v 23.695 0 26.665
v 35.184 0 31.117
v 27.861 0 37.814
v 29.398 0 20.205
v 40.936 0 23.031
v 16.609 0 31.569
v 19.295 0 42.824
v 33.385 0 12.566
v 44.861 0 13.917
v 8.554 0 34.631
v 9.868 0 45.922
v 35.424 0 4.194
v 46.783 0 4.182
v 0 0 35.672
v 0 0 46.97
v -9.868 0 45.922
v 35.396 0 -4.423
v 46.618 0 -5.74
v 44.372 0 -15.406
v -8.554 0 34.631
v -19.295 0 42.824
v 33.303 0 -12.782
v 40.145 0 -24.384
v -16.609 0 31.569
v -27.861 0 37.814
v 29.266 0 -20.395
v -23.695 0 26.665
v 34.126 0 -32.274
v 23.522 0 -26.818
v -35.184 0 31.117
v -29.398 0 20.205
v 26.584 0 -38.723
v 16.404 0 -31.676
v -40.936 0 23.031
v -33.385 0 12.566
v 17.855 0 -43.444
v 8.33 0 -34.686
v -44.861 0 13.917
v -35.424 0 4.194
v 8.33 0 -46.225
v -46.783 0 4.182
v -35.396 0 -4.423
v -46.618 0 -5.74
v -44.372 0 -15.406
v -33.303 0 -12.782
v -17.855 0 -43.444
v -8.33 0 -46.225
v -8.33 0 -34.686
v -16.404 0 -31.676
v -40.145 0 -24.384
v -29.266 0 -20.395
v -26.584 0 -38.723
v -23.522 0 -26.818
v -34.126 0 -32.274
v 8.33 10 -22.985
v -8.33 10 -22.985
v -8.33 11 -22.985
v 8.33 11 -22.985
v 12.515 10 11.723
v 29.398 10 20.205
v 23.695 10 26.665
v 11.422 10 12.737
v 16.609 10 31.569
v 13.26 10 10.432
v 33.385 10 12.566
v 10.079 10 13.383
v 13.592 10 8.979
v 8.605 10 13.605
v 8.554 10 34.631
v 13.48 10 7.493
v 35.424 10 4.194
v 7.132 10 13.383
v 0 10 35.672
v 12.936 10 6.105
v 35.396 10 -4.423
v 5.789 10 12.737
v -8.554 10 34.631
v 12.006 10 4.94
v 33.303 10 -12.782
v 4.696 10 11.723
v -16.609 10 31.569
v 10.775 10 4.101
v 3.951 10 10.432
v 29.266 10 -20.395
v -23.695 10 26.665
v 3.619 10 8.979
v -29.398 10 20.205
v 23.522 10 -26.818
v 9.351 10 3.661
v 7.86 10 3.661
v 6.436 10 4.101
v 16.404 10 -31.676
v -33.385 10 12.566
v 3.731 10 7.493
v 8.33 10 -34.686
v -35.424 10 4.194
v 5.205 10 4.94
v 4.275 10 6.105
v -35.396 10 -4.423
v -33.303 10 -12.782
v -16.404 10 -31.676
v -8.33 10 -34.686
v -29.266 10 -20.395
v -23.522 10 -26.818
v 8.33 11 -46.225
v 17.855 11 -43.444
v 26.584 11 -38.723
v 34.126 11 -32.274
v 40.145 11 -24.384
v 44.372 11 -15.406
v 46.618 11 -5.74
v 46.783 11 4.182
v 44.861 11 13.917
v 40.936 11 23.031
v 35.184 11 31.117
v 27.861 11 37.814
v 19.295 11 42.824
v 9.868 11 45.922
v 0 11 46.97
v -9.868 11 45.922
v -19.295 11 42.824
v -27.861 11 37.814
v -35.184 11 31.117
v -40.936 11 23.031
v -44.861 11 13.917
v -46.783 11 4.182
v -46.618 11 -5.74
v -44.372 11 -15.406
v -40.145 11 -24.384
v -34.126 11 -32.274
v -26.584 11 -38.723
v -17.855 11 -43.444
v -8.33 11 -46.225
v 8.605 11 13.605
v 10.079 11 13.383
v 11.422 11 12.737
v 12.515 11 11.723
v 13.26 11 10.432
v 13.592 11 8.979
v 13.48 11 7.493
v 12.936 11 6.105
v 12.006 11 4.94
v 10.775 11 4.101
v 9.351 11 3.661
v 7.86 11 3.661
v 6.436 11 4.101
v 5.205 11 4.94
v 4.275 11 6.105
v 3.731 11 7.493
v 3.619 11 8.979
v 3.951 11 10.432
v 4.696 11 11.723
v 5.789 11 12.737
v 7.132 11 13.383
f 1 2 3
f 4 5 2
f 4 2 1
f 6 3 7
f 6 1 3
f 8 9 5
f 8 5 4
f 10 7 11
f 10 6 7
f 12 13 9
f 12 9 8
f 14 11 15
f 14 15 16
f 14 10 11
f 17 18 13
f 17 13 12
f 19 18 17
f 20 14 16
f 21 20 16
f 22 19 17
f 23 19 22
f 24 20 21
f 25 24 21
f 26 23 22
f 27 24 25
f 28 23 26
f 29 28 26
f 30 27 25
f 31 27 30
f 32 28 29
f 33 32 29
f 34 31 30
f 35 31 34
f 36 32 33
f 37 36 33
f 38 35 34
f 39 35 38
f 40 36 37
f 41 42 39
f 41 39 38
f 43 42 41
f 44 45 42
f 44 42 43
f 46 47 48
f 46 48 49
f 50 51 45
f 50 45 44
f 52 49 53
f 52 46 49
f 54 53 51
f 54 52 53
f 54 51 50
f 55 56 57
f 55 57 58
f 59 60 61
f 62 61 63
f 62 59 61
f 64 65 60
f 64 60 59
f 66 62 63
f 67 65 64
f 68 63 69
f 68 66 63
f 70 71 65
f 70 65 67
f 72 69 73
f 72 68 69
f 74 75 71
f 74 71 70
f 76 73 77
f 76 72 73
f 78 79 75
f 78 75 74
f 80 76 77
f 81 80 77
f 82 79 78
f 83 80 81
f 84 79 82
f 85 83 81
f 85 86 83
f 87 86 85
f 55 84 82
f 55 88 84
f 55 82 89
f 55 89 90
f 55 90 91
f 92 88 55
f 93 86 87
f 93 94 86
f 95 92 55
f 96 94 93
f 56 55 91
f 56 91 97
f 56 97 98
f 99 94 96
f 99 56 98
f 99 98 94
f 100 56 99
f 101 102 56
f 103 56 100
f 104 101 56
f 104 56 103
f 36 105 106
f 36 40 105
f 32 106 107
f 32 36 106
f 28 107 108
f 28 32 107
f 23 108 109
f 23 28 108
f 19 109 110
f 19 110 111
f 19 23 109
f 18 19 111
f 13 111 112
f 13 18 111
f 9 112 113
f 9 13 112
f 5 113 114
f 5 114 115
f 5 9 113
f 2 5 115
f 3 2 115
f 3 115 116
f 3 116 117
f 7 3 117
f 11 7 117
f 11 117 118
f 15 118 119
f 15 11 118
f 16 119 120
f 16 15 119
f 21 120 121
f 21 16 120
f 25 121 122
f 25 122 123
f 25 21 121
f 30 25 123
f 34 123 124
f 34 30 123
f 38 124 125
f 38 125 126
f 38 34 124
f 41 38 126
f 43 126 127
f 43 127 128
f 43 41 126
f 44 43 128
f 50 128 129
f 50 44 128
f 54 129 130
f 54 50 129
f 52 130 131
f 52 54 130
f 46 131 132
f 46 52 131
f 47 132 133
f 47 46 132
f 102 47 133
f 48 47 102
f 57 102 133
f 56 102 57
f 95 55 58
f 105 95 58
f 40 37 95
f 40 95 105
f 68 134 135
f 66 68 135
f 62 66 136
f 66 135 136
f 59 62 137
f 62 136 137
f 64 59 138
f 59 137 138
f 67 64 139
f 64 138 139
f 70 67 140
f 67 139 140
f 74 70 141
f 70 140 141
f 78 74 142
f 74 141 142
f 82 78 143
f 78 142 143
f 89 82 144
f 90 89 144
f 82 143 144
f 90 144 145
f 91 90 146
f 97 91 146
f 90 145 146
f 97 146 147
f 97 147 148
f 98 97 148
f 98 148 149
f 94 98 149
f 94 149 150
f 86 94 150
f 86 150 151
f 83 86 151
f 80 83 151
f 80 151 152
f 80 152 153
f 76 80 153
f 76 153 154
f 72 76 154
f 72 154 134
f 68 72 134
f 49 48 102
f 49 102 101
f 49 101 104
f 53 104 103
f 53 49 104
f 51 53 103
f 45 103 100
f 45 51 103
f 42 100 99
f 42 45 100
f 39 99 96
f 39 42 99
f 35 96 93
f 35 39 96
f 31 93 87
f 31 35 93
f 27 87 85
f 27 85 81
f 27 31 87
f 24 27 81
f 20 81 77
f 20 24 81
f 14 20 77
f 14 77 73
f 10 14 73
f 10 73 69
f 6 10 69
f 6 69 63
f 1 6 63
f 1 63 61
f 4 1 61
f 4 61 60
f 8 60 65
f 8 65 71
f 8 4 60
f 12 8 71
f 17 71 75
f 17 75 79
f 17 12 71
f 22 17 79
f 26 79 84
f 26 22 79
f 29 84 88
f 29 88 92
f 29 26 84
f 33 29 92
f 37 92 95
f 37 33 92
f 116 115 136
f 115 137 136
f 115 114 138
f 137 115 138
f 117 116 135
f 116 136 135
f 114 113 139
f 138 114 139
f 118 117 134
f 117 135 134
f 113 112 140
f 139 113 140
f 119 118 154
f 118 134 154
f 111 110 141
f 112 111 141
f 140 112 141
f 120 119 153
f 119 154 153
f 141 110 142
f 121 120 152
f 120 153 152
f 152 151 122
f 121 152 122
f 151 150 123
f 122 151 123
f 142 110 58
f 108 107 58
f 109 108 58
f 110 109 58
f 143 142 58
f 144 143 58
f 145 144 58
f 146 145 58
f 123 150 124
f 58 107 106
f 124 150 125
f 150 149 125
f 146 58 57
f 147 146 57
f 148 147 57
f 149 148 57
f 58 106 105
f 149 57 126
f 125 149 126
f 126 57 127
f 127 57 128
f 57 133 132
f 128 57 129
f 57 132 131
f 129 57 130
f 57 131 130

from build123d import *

# Parameters (mm, degrees)
BOSS_EXTRUDE1_DEPTH = 10
BOSS_EXTRUDE2_DEPTH = 1
SKETCH4_R           = 5
CUT_EXTRUDE1_DEPTH  = 68.330244319


with BuildPart() as part:
    # Sketch2 → Boss-Extrude1 (new body)
    with BuildSketch(Plane(origin=(0, 0, 0), x_dir=(1, 0, 0), z_dir=(0, 1, 0))):
        with BuildLine():
            Line((-8.33, 46.225447537), (-8.33, 34.685513519))
            ThreePointArc((-8.33, 34.685513519), (0, -35.67175), (8.33, 34.685513519))
            Line((8.33, 34.685513519), (8.33, 46.225447537))
            ThreePointArc((8.33, 46.225447537), (0, -46.97), (-8.33, 46.225447537))
        make_face()
    extrude(amount=BOSS_EXTRUDE1_DEPTH)

    # Sketch3 → Boss-Extrude2 (add)
    with BuildSketch(Plane(origin=(0, 10, 0), x_dir=(1, 0, 0), z_dir=(0, 1, 0))):
        with BuildLine():
            Line((-8.33, 46.225447537), (-8.33, 22.985447537))
            Line((-8.33, 22.985447537), (8.33, 22.985447537))
            Line((8.33, 22.985447537), (8.33, 46.225447537))
            ThreePointArc((8.33, 46.225447537), (0, -46.97), (-8.33, 46.225447537))
        make_face()
    extrude(amount=BOSS_EXTRUDE2_DEPTH)

    # Sketch4 → Cut-Extrude1 (cut, through all)
    with BuildSketch(Plane(origin=(0, 11, 0), x_dir=(1, 0, 0), z_dir=(0, 1, 0))):
        with Locations(Location((8.605489527, -8.605489527, 0), (0, 0, 270))):
            Circle(SKETCH4_R)
    extrude(amount=-CUT_EXTRUDE1_DEPTH, mode=Mode.SUBTRACT)


solid = part.part
